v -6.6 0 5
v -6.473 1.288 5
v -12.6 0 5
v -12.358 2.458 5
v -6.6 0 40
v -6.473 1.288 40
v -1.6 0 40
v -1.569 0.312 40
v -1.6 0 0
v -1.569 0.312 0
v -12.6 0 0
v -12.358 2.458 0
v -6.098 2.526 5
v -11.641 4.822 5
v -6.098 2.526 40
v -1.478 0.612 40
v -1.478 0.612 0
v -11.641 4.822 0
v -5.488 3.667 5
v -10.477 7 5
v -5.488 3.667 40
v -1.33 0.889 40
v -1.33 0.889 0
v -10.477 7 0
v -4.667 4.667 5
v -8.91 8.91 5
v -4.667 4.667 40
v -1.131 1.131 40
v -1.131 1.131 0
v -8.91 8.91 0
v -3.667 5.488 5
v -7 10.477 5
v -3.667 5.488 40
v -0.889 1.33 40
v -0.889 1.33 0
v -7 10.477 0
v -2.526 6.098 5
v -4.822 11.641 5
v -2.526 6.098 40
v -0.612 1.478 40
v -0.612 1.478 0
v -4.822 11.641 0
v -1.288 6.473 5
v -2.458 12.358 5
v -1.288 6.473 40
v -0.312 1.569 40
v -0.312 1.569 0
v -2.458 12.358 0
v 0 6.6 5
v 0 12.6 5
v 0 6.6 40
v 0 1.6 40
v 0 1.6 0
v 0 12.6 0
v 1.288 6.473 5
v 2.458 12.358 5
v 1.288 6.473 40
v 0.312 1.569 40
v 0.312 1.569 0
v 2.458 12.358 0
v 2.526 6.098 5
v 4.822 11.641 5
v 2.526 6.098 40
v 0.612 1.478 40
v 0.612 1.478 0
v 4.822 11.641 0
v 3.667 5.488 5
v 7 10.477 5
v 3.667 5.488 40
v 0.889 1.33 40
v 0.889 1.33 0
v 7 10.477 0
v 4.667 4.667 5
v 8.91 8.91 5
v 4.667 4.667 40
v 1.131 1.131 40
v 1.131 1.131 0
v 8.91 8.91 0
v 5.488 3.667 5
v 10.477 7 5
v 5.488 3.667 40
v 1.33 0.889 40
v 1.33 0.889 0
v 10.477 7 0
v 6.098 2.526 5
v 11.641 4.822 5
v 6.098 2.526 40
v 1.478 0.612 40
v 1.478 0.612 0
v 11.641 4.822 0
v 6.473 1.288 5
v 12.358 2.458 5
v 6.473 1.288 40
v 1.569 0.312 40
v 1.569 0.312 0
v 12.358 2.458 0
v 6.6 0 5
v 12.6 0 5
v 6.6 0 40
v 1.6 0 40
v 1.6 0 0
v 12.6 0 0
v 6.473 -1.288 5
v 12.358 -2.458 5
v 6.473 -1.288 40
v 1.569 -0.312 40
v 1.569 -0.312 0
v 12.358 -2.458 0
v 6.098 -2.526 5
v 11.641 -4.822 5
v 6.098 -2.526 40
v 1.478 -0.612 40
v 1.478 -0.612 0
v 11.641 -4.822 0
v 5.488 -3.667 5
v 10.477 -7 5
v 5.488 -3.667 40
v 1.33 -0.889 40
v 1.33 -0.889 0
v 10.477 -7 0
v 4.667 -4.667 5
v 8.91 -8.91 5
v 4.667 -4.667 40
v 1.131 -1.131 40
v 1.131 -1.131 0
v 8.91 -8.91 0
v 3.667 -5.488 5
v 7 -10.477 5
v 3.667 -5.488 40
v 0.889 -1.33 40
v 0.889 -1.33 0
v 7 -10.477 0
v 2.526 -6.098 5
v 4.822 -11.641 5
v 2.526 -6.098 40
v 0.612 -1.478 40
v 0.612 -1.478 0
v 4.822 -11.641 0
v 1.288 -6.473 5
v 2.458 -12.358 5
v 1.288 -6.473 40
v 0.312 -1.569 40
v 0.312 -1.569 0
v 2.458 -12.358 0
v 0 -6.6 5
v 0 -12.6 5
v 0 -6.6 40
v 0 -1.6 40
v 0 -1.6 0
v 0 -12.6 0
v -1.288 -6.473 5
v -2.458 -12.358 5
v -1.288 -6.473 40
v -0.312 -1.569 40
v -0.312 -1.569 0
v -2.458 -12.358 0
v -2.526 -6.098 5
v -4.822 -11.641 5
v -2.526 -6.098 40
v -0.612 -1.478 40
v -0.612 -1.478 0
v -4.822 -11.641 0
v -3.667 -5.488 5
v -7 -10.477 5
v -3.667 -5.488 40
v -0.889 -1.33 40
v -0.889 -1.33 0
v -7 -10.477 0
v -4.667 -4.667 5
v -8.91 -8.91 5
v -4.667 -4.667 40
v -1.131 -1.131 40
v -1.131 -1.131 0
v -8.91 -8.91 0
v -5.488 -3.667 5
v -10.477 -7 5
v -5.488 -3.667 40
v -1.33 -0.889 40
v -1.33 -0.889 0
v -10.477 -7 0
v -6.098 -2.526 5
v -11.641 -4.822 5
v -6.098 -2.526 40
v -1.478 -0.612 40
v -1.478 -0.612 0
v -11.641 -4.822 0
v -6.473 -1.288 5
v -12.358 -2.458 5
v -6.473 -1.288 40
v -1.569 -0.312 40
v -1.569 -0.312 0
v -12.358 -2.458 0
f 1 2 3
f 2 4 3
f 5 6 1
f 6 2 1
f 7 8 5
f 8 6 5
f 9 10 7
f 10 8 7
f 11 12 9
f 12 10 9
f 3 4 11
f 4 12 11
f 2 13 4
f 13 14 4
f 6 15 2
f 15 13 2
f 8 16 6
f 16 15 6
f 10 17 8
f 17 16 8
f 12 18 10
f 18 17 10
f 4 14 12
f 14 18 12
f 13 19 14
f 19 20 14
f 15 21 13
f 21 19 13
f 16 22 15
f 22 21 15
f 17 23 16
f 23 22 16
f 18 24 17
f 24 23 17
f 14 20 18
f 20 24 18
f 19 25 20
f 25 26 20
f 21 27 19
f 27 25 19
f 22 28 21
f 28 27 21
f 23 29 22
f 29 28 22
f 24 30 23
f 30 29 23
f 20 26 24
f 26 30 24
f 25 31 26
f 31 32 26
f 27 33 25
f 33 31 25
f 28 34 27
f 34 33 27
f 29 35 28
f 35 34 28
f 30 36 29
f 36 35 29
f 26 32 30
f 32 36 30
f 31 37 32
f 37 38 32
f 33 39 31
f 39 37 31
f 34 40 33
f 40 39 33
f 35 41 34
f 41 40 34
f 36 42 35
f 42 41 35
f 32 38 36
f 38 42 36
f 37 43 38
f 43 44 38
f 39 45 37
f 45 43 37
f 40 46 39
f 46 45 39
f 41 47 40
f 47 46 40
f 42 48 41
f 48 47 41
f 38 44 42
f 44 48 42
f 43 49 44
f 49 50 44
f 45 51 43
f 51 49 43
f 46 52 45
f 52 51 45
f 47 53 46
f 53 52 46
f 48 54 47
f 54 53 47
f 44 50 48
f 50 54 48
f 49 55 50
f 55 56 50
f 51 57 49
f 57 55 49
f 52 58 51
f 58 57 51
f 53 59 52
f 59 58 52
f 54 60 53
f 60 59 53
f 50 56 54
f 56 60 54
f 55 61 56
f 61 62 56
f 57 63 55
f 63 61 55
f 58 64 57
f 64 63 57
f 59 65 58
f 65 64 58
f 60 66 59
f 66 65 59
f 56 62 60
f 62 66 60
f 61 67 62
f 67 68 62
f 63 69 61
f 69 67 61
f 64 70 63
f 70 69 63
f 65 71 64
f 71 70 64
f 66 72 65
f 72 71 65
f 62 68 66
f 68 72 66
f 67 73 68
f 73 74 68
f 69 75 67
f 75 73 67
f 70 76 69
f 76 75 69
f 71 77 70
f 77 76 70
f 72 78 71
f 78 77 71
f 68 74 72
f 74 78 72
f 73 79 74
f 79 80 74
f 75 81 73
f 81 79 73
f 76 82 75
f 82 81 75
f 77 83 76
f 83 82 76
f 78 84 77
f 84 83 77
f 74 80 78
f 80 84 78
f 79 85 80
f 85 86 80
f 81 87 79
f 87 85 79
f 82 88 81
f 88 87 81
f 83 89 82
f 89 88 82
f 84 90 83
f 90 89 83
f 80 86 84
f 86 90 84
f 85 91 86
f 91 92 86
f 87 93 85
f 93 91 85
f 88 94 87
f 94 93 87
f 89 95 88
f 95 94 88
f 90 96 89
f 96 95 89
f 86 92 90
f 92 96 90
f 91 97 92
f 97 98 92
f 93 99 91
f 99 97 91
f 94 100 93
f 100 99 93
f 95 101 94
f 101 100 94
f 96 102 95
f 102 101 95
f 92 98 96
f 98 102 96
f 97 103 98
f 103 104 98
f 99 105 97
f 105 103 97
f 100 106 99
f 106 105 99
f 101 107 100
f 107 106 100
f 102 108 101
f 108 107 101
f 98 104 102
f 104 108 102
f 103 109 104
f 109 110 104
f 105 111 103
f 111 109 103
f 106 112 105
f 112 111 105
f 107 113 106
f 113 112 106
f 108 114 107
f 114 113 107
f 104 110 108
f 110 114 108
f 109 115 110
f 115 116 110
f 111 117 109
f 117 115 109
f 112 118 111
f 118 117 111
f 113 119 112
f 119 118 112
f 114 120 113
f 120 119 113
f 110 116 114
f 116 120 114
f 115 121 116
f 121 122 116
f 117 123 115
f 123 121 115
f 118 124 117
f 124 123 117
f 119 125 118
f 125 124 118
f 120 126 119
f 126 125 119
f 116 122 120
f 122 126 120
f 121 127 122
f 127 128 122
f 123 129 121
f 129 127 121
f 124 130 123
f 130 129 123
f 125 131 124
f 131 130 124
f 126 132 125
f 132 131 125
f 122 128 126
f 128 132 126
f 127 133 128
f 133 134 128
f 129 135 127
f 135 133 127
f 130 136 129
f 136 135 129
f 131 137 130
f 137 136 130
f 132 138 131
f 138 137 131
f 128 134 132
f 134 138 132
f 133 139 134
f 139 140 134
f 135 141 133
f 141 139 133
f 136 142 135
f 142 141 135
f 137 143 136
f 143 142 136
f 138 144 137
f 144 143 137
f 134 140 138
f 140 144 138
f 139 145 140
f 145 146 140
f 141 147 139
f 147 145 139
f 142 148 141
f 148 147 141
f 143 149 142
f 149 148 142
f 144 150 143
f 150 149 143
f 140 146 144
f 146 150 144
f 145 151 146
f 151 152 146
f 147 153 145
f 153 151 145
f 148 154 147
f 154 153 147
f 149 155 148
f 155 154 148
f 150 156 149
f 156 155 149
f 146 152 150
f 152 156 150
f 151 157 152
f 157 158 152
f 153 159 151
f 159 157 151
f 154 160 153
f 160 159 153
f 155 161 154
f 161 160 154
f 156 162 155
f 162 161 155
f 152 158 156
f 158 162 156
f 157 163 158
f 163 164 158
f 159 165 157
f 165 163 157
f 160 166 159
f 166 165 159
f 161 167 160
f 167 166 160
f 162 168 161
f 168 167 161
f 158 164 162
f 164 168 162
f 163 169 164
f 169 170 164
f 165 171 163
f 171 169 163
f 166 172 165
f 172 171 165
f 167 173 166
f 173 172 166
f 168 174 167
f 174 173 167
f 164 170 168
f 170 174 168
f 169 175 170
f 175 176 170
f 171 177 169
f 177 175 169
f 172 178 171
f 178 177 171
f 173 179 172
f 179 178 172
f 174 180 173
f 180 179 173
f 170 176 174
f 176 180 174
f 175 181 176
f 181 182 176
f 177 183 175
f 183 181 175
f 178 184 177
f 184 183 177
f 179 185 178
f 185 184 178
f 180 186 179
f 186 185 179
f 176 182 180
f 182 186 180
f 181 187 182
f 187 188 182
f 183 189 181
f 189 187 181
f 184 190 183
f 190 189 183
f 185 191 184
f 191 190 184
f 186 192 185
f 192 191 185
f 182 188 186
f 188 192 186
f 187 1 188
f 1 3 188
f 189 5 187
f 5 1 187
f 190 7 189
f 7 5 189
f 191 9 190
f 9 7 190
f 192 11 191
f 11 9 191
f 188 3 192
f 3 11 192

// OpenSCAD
$fn = 32;

// ----------------------------------------------------------------------
// Profiled standoff: flanged spacer, 40 mm long, bore 3.2 mm
// ----------------------------------------------------------------------

// --- parameters (mm) ---
revolve_angle = 360;      // full turn around the Z axis
profile_points = 6;       // points of the closed outline

profile = [[1.6, 0], [12.6, 0], [12.6, 5], [6.6, 5], [6.6, 40], [1.6, 40]];  // single closed polygon, 6 points, counter clockwise

// --- the one profile operation ---
rotate_extrude(angle = revolve_angle) polygon(points = profile);
